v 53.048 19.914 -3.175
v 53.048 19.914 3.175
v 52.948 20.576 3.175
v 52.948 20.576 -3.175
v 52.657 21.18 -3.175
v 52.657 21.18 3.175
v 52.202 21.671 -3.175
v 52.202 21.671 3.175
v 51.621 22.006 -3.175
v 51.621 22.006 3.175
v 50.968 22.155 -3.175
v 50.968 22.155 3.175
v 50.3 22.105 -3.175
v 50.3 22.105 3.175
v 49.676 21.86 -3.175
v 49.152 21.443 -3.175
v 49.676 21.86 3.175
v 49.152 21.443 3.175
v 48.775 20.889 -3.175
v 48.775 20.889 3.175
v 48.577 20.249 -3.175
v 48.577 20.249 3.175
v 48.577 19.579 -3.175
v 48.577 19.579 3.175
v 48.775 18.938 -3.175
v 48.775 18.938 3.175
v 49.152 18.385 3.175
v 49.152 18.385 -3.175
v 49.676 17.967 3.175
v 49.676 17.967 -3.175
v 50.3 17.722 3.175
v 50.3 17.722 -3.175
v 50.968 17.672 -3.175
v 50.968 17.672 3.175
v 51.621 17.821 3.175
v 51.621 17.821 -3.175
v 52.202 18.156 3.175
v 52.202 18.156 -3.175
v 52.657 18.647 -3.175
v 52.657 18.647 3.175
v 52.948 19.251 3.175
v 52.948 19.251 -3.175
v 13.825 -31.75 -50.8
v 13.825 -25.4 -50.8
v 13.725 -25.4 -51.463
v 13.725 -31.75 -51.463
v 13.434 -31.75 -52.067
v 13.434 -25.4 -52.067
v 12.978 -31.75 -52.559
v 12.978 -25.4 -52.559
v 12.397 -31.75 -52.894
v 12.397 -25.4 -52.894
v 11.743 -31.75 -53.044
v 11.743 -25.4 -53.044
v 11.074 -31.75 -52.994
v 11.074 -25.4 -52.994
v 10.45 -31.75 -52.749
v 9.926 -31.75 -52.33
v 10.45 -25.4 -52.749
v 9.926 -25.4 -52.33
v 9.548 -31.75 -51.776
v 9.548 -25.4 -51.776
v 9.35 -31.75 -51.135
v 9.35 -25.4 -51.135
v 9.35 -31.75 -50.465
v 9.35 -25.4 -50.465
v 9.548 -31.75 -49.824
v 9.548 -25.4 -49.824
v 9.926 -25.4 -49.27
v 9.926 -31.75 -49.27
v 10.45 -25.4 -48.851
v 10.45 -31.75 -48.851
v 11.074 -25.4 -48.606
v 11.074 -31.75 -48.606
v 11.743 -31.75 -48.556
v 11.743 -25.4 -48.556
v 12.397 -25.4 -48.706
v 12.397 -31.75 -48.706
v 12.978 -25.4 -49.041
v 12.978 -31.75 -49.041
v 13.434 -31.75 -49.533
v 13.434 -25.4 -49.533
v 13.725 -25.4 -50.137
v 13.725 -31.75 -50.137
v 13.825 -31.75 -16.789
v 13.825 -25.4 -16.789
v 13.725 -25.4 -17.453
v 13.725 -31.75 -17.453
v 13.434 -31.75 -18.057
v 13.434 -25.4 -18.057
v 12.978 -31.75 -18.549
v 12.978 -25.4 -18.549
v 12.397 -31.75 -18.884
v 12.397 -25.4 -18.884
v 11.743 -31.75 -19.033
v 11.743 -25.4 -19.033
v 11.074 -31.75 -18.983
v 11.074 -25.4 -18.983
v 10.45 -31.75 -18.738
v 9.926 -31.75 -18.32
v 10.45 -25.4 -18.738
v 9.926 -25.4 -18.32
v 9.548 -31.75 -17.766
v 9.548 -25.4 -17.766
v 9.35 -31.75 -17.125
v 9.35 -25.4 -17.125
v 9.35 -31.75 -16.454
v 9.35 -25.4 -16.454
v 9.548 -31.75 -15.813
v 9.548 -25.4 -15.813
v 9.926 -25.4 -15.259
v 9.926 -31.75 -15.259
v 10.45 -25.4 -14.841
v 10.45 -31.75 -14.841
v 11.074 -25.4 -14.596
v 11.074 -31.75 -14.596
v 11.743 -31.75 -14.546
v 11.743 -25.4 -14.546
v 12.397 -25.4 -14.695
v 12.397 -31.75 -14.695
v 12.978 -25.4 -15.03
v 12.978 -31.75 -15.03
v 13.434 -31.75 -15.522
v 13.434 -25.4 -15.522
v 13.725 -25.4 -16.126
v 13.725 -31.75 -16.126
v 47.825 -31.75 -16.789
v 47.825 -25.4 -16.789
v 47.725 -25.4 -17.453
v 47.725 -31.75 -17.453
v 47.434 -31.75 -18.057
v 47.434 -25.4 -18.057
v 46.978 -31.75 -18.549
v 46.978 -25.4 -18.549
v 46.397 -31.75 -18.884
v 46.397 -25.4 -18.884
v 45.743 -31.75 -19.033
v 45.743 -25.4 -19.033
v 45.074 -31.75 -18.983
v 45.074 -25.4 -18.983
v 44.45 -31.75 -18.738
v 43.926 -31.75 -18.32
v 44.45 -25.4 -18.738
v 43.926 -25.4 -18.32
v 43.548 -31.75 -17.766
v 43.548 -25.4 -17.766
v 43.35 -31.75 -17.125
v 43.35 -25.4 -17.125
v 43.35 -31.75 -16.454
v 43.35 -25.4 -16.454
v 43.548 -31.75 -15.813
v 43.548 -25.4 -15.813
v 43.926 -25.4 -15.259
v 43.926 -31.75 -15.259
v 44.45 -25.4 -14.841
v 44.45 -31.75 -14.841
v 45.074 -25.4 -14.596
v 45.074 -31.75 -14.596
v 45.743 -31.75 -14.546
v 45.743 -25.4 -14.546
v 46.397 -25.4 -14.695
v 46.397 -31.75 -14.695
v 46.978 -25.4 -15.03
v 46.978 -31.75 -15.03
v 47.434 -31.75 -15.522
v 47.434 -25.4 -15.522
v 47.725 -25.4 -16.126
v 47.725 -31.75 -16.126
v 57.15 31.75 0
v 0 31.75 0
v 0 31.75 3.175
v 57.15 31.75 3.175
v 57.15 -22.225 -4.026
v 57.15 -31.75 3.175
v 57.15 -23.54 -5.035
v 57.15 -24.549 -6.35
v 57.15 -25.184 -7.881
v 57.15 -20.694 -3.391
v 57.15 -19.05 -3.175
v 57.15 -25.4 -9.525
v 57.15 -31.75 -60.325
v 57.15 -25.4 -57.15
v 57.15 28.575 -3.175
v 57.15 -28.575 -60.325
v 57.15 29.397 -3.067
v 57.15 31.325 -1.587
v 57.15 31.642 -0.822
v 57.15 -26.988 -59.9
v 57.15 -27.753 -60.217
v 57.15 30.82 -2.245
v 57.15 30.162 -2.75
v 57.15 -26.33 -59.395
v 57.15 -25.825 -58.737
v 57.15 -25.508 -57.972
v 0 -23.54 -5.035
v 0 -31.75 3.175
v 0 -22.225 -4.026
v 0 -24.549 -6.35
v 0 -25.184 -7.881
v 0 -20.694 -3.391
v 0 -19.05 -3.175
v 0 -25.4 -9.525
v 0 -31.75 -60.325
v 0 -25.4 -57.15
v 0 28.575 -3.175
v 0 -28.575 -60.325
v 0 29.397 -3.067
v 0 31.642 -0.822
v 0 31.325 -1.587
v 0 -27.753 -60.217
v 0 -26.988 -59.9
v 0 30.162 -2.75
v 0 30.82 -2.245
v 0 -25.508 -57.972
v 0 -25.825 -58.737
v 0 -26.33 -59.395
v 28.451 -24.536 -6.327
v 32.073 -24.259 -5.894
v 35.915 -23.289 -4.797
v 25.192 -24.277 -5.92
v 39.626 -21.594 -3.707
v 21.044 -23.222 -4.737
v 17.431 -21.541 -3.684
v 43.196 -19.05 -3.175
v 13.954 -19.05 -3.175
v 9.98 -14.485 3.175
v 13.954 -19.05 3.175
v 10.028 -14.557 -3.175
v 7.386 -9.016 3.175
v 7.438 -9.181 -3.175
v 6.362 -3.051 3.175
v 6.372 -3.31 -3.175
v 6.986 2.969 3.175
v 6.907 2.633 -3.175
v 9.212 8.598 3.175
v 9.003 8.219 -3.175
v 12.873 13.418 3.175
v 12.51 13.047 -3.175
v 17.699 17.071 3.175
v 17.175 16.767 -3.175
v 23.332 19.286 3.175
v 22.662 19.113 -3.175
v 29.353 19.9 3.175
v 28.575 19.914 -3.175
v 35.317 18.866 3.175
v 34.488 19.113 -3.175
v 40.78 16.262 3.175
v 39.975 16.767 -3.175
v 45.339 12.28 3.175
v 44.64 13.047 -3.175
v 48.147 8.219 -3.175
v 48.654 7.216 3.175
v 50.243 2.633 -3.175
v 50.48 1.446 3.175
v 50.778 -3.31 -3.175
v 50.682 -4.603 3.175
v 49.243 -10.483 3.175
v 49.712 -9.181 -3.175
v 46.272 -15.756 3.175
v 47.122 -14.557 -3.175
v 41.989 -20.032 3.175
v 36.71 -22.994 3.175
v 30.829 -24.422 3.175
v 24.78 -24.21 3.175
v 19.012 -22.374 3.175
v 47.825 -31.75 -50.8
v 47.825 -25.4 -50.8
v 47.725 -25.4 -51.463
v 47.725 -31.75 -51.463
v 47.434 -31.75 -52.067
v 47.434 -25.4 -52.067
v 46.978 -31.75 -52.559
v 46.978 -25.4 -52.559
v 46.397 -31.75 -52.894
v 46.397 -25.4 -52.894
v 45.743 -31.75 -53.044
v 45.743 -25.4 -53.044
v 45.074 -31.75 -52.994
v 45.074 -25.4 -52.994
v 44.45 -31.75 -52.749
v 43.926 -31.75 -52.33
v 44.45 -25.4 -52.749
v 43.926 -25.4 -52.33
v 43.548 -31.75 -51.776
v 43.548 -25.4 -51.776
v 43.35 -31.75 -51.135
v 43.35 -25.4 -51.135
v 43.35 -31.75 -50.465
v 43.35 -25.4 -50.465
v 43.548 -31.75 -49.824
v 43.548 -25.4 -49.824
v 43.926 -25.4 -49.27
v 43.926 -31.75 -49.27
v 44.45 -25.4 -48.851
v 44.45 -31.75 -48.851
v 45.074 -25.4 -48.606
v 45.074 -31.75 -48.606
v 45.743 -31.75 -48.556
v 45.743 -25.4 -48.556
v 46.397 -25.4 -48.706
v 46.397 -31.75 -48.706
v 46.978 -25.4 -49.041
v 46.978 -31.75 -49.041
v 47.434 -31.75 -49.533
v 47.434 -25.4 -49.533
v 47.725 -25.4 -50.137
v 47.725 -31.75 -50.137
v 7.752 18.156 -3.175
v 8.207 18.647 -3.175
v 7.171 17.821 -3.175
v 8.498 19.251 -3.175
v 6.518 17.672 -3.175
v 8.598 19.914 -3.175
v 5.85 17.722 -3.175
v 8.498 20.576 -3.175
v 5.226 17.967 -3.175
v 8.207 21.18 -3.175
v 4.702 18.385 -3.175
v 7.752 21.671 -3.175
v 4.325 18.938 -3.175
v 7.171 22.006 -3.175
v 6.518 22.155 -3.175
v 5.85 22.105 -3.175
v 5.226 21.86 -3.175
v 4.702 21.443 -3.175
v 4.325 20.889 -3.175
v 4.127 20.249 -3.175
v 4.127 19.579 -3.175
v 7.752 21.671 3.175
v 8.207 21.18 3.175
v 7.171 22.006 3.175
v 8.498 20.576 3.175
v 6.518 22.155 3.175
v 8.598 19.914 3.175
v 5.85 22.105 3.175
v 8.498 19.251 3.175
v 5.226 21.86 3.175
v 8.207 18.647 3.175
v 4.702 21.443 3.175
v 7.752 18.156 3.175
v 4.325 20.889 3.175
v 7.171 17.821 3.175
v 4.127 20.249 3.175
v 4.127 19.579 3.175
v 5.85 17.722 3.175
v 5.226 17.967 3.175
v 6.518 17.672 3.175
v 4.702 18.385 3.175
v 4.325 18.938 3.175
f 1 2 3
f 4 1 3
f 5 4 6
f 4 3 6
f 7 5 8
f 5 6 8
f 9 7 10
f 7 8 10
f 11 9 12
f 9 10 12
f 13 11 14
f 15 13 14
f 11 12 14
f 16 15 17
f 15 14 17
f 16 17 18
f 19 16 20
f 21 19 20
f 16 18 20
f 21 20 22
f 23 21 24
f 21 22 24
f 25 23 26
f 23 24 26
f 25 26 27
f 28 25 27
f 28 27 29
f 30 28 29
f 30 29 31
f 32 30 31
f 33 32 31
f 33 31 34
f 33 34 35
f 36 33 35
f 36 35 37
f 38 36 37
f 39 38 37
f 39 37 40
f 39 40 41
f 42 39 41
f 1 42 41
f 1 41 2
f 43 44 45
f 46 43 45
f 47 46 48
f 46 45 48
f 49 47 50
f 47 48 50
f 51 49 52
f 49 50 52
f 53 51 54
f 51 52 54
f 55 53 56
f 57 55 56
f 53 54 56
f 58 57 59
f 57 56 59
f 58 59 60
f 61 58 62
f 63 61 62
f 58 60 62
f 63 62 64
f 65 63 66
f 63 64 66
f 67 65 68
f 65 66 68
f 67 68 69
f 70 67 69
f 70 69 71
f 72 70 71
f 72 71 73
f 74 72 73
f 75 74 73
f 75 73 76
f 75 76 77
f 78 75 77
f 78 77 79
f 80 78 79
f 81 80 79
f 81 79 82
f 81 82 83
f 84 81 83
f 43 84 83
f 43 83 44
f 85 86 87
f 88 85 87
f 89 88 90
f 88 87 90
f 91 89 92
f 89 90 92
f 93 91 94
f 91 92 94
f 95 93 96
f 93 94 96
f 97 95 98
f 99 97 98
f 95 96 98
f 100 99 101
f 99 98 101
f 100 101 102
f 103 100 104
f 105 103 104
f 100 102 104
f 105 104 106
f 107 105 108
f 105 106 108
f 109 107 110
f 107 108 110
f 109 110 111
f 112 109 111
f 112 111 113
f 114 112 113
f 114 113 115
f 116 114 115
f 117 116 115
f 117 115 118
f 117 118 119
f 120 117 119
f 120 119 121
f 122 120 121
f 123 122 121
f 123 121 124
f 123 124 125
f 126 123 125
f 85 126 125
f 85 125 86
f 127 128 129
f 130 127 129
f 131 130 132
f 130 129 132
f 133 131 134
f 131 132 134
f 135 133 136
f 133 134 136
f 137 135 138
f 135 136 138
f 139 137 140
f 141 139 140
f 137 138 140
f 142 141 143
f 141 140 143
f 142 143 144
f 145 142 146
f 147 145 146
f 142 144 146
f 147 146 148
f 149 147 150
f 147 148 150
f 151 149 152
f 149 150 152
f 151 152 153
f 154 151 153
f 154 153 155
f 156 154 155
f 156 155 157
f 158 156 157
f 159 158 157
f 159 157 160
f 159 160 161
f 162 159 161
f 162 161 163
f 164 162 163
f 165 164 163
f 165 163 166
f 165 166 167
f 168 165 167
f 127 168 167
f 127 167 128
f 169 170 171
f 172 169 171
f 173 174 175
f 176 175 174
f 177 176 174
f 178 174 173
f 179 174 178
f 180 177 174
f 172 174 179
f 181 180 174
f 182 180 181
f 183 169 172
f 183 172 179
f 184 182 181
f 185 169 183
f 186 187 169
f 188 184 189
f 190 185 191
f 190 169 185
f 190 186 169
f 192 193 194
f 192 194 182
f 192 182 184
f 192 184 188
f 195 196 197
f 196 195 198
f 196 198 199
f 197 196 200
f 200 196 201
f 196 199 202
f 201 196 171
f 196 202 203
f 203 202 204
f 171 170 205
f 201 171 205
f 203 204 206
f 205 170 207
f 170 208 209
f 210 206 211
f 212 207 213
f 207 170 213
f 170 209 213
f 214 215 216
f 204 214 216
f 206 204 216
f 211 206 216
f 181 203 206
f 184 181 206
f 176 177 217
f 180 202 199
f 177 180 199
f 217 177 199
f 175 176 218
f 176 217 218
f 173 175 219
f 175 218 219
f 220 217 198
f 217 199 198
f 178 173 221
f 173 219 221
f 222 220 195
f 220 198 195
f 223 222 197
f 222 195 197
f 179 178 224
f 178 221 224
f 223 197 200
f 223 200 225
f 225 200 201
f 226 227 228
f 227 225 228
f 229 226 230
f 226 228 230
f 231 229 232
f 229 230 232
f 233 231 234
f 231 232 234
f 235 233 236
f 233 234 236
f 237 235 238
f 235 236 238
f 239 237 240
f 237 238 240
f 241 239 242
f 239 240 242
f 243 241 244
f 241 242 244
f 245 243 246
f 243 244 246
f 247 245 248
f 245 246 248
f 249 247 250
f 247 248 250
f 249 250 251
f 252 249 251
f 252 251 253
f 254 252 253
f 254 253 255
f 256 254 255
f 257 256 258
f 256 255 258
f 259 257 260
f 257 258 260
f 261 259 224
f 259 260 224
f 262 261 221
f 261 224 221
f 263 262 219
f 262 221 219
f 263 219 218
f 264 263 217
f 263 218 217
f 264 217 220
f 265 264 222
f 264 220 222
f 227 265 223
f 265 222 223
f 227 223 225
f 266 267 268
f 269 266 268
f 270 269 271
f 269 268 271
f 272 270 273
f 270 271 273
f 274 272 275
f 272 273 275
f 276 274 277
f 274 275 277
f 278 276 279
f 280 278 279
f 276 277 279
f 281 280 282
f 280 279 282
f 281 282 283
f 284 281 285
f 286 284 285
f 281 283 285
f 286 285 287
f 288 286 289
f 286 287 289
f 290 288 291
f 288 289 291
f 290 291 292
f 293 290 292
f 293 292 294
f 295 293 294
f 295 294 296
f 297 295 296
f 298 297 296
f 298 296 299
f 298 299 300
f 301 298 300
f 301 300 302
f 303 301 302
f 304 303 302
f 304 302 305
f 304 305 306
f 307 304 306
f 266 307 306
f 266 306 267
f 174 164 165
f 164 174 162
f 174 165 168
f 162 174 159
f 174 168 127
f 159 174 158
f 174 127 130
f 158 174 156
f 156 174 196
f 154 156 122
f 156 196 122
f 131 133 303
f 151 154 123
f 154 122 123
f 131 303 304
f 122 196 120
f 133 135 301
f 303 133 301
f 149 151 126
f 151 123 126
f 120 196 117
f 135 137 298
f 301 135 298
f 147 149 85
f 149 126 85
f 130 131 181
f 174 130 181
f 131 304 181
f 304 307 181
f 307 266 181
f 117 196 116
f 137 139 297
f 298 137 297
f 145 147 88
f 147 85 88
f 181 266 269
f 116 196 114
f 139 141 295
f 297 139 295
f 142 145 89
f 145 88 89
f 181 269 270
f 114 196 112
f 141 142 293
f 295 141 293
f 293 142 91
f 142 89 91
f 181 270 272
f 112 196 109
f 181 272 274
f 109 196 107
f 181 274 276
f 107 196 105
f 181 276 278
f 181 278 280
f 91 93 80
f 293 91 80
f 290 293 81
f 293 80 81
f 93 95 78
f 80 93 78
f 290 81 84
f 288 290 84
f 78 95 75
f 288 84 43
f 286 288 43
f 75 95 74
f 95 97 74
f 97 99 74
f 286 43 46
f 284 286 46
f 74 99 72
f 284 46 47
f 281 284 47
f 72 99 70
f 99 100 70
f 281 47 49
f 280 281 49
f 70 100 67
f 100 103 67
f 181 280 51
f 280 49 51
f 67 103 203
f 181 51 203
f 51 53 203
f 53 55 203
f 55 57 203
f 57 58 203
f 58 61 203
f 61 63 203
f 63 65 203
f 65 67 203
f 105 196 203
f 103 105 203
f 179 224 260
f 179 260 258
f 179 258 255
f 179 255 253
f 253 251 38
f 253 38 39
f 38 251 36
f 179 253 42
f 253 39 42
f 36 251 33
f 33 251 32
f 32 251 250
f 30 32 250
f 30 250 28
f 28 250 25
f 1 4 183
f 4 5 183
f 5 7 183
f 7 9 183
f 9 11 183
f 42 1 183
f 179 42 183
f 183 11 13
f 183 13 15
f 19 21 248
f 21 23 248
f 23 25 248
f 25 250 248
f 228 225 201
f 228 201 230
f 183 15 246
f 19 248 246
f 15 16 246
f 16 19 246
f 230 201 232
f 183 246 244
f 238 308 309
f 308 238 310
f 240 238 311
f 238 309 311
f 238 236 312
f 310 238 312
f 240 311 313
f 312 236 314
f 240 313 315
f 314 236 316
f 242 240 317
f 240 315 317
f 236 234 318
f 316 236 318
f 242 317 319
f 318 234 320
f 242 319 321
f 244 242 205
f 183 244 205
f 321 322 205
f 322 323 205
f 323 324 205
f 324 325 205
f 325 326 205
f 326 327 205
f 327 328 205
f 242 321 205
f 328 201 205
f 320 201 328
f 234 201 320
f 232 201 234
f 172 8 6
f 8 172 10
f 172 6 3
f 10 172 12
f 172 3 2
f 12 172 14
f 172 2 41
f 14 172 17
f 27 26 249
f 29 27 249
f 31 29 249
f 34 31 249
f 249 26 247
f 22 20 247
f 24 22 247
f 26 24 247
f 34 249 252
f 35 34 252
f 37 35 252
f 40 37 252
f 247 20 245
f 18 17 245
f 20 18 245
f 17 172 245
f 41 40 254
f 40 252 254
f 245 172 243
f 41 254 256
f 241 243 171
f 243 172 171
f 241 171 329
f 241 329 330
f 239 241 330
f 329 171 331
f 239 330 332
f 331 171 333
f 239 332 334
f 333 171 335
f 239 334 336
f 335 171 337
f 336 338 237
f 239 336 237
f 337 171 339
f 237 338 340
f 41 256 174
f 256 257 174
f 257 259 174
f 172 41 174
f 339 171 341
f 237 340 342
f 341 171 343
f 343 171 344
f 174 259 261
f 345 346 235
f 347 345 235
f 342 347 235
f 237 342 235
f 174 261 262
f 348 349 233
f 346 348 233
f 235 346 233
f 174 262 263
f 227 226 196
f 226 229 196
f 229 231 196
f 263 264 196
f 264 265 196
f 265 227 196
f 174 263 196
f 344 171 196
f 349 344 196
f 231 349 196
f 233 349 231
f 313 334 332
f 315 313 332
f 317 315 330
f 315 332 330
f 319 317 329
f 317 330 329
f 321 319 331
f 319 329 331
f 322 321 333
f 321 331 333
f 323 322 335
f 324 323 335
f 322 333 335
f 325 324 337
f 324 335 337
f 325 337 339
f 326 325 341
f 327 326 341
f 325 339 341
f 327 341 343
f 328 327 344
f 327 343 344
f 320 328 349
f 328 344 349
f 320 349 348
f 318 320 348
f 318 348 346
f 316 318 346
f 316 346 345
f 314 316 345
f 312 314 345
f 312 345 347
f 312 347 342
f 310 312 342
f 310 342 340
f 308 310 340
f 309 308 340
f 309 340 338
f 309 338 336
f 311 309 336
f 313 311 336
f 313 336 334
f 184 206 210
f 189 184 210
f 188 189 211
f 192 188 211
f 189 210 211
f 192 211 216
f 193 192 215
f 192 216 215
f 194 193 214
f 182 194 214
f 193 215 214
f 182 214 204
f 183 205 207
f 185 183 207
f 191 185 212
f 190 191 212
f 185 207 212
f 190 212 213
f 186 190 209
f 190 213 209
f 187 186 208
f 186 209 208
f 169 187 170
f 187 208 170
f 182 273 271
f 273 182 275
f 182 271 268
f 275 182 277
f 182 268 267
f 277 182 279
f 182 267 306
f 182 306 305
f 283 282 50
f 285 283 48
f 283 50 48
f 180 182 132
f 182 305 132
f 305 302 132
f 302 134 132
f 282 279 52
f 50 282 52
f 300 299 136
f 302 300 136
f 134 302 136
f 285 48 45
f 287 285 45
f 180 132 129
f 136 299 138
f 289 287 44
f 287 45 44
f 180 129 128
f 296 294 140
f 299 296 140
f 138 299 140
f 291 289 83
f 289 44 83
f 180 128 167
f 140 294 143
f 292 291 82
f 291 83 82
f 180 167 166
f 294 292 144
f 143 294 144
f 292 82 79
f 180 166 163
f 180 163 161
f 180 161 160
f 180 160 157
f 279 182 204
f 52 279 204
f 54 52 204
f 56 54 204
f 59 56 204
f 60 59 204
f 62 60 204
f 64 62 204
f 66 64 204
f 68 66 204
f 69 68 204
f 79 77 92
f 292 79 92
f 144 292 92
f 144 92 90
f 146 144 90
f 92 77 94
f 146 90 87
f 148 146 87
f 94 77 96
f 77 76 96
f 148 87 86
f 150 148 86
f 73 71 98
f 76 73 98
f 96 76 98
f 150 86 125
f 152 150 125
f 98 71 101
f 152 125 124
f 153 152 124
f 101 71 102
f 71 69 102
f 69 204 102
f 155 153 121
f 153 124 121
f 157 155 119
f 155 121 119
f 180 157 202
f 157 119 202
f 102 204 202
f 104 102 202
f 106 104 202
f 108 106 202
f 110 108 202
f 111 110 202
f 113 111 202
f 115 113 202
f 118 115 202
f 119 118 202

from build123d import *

# Parameters (mm, degrees)
BOSS_EXTRUDE1_DEPTH   = 57.15
M4_CLEARANCE_HOLE1_D  = 4.5
SKETCH7_R             = 22.225
CUT_EXTRUDE1_DEPTH    = 28.575
F_8_CLEARANCE_HOLE1_D = 4.4958


with BuildPart() as part:
    # Sketch1 → Boss-Extrude1 (new body)
    with BuildSketch(Plane(origin=(0, 0, 0), x_dir=(0, 0, -1), z_dir=(1, 0, 0))):
        with BuildLine():
            Line((3.175, -19.05), (3.175, 28.575))
            ThreePointArc((3.175, 28.575), (2.24506403, 30.82006403), (0, 31.75))
            Line((0, 31.75), (-3.175, 31.75))
            Line((-3.175, 31.75), (-3.175, -31.75))
            Line((-3.175, -31.75), (60.325, -31.75))
            Line((60.325, -31.75), (60.325, -28.575))
            ThreePointArc((60.325, -28.575), (59.39506403, -26.32993597), (57.15, -25.4))
            Line((57.15, -25.4), (9.525, -25.4))
            ThreePointArc((9.525, -25.4), (5.034871939, -23.540128061), (3.175, -19.05))
        make_face()
    extrude(amount=BOSS_EXTRUDE1_DEPTH)

    # M4 Clearance Hole1 (through all)
    with Locations(Plane(origin=(0, -31.75, 0), x_dir=(-1, 0, 0), z_dir=(0, -1, 0))):
        with Locations((-45.575, 50.8), (-11.575, 50.8), (-11.575, 16.7894), (-45.575, 16.7894)):
            Hole(M4_CLEARANCE_HOLE1_D / 2)

    # Sketch7 → Cut-Extrude1 (cut, symmetric)
    with BuildSketch(Plane(origin=(0, 0, -3.175), x_dir=(-1, 0, 0), z_dir=(0, 0, -1))):
        with Locations(Location((-28.575, -2.3114, 0), (0, 0, 311.136639748))):  # turned: the seam where the file's is
            Circle(SKETCH7_R)
    extrude(amount=CUT_EXTRUDE1_DEPTH, both=True, mode=Mode.SUBTRACT)

    # #8 Clearance Hole1 (through all)
    with Locations(Plane(origin=(0, 0, -3.175), x_dir=(-1, 0, 0), z_dir=(0, 0, -1))):
        with Locations((-50.8, 19.9136), (-6.35, 19.9136)):
            Hole(F_8_CLEARANCE_HOLE1_D / 2)


solid = part.part
